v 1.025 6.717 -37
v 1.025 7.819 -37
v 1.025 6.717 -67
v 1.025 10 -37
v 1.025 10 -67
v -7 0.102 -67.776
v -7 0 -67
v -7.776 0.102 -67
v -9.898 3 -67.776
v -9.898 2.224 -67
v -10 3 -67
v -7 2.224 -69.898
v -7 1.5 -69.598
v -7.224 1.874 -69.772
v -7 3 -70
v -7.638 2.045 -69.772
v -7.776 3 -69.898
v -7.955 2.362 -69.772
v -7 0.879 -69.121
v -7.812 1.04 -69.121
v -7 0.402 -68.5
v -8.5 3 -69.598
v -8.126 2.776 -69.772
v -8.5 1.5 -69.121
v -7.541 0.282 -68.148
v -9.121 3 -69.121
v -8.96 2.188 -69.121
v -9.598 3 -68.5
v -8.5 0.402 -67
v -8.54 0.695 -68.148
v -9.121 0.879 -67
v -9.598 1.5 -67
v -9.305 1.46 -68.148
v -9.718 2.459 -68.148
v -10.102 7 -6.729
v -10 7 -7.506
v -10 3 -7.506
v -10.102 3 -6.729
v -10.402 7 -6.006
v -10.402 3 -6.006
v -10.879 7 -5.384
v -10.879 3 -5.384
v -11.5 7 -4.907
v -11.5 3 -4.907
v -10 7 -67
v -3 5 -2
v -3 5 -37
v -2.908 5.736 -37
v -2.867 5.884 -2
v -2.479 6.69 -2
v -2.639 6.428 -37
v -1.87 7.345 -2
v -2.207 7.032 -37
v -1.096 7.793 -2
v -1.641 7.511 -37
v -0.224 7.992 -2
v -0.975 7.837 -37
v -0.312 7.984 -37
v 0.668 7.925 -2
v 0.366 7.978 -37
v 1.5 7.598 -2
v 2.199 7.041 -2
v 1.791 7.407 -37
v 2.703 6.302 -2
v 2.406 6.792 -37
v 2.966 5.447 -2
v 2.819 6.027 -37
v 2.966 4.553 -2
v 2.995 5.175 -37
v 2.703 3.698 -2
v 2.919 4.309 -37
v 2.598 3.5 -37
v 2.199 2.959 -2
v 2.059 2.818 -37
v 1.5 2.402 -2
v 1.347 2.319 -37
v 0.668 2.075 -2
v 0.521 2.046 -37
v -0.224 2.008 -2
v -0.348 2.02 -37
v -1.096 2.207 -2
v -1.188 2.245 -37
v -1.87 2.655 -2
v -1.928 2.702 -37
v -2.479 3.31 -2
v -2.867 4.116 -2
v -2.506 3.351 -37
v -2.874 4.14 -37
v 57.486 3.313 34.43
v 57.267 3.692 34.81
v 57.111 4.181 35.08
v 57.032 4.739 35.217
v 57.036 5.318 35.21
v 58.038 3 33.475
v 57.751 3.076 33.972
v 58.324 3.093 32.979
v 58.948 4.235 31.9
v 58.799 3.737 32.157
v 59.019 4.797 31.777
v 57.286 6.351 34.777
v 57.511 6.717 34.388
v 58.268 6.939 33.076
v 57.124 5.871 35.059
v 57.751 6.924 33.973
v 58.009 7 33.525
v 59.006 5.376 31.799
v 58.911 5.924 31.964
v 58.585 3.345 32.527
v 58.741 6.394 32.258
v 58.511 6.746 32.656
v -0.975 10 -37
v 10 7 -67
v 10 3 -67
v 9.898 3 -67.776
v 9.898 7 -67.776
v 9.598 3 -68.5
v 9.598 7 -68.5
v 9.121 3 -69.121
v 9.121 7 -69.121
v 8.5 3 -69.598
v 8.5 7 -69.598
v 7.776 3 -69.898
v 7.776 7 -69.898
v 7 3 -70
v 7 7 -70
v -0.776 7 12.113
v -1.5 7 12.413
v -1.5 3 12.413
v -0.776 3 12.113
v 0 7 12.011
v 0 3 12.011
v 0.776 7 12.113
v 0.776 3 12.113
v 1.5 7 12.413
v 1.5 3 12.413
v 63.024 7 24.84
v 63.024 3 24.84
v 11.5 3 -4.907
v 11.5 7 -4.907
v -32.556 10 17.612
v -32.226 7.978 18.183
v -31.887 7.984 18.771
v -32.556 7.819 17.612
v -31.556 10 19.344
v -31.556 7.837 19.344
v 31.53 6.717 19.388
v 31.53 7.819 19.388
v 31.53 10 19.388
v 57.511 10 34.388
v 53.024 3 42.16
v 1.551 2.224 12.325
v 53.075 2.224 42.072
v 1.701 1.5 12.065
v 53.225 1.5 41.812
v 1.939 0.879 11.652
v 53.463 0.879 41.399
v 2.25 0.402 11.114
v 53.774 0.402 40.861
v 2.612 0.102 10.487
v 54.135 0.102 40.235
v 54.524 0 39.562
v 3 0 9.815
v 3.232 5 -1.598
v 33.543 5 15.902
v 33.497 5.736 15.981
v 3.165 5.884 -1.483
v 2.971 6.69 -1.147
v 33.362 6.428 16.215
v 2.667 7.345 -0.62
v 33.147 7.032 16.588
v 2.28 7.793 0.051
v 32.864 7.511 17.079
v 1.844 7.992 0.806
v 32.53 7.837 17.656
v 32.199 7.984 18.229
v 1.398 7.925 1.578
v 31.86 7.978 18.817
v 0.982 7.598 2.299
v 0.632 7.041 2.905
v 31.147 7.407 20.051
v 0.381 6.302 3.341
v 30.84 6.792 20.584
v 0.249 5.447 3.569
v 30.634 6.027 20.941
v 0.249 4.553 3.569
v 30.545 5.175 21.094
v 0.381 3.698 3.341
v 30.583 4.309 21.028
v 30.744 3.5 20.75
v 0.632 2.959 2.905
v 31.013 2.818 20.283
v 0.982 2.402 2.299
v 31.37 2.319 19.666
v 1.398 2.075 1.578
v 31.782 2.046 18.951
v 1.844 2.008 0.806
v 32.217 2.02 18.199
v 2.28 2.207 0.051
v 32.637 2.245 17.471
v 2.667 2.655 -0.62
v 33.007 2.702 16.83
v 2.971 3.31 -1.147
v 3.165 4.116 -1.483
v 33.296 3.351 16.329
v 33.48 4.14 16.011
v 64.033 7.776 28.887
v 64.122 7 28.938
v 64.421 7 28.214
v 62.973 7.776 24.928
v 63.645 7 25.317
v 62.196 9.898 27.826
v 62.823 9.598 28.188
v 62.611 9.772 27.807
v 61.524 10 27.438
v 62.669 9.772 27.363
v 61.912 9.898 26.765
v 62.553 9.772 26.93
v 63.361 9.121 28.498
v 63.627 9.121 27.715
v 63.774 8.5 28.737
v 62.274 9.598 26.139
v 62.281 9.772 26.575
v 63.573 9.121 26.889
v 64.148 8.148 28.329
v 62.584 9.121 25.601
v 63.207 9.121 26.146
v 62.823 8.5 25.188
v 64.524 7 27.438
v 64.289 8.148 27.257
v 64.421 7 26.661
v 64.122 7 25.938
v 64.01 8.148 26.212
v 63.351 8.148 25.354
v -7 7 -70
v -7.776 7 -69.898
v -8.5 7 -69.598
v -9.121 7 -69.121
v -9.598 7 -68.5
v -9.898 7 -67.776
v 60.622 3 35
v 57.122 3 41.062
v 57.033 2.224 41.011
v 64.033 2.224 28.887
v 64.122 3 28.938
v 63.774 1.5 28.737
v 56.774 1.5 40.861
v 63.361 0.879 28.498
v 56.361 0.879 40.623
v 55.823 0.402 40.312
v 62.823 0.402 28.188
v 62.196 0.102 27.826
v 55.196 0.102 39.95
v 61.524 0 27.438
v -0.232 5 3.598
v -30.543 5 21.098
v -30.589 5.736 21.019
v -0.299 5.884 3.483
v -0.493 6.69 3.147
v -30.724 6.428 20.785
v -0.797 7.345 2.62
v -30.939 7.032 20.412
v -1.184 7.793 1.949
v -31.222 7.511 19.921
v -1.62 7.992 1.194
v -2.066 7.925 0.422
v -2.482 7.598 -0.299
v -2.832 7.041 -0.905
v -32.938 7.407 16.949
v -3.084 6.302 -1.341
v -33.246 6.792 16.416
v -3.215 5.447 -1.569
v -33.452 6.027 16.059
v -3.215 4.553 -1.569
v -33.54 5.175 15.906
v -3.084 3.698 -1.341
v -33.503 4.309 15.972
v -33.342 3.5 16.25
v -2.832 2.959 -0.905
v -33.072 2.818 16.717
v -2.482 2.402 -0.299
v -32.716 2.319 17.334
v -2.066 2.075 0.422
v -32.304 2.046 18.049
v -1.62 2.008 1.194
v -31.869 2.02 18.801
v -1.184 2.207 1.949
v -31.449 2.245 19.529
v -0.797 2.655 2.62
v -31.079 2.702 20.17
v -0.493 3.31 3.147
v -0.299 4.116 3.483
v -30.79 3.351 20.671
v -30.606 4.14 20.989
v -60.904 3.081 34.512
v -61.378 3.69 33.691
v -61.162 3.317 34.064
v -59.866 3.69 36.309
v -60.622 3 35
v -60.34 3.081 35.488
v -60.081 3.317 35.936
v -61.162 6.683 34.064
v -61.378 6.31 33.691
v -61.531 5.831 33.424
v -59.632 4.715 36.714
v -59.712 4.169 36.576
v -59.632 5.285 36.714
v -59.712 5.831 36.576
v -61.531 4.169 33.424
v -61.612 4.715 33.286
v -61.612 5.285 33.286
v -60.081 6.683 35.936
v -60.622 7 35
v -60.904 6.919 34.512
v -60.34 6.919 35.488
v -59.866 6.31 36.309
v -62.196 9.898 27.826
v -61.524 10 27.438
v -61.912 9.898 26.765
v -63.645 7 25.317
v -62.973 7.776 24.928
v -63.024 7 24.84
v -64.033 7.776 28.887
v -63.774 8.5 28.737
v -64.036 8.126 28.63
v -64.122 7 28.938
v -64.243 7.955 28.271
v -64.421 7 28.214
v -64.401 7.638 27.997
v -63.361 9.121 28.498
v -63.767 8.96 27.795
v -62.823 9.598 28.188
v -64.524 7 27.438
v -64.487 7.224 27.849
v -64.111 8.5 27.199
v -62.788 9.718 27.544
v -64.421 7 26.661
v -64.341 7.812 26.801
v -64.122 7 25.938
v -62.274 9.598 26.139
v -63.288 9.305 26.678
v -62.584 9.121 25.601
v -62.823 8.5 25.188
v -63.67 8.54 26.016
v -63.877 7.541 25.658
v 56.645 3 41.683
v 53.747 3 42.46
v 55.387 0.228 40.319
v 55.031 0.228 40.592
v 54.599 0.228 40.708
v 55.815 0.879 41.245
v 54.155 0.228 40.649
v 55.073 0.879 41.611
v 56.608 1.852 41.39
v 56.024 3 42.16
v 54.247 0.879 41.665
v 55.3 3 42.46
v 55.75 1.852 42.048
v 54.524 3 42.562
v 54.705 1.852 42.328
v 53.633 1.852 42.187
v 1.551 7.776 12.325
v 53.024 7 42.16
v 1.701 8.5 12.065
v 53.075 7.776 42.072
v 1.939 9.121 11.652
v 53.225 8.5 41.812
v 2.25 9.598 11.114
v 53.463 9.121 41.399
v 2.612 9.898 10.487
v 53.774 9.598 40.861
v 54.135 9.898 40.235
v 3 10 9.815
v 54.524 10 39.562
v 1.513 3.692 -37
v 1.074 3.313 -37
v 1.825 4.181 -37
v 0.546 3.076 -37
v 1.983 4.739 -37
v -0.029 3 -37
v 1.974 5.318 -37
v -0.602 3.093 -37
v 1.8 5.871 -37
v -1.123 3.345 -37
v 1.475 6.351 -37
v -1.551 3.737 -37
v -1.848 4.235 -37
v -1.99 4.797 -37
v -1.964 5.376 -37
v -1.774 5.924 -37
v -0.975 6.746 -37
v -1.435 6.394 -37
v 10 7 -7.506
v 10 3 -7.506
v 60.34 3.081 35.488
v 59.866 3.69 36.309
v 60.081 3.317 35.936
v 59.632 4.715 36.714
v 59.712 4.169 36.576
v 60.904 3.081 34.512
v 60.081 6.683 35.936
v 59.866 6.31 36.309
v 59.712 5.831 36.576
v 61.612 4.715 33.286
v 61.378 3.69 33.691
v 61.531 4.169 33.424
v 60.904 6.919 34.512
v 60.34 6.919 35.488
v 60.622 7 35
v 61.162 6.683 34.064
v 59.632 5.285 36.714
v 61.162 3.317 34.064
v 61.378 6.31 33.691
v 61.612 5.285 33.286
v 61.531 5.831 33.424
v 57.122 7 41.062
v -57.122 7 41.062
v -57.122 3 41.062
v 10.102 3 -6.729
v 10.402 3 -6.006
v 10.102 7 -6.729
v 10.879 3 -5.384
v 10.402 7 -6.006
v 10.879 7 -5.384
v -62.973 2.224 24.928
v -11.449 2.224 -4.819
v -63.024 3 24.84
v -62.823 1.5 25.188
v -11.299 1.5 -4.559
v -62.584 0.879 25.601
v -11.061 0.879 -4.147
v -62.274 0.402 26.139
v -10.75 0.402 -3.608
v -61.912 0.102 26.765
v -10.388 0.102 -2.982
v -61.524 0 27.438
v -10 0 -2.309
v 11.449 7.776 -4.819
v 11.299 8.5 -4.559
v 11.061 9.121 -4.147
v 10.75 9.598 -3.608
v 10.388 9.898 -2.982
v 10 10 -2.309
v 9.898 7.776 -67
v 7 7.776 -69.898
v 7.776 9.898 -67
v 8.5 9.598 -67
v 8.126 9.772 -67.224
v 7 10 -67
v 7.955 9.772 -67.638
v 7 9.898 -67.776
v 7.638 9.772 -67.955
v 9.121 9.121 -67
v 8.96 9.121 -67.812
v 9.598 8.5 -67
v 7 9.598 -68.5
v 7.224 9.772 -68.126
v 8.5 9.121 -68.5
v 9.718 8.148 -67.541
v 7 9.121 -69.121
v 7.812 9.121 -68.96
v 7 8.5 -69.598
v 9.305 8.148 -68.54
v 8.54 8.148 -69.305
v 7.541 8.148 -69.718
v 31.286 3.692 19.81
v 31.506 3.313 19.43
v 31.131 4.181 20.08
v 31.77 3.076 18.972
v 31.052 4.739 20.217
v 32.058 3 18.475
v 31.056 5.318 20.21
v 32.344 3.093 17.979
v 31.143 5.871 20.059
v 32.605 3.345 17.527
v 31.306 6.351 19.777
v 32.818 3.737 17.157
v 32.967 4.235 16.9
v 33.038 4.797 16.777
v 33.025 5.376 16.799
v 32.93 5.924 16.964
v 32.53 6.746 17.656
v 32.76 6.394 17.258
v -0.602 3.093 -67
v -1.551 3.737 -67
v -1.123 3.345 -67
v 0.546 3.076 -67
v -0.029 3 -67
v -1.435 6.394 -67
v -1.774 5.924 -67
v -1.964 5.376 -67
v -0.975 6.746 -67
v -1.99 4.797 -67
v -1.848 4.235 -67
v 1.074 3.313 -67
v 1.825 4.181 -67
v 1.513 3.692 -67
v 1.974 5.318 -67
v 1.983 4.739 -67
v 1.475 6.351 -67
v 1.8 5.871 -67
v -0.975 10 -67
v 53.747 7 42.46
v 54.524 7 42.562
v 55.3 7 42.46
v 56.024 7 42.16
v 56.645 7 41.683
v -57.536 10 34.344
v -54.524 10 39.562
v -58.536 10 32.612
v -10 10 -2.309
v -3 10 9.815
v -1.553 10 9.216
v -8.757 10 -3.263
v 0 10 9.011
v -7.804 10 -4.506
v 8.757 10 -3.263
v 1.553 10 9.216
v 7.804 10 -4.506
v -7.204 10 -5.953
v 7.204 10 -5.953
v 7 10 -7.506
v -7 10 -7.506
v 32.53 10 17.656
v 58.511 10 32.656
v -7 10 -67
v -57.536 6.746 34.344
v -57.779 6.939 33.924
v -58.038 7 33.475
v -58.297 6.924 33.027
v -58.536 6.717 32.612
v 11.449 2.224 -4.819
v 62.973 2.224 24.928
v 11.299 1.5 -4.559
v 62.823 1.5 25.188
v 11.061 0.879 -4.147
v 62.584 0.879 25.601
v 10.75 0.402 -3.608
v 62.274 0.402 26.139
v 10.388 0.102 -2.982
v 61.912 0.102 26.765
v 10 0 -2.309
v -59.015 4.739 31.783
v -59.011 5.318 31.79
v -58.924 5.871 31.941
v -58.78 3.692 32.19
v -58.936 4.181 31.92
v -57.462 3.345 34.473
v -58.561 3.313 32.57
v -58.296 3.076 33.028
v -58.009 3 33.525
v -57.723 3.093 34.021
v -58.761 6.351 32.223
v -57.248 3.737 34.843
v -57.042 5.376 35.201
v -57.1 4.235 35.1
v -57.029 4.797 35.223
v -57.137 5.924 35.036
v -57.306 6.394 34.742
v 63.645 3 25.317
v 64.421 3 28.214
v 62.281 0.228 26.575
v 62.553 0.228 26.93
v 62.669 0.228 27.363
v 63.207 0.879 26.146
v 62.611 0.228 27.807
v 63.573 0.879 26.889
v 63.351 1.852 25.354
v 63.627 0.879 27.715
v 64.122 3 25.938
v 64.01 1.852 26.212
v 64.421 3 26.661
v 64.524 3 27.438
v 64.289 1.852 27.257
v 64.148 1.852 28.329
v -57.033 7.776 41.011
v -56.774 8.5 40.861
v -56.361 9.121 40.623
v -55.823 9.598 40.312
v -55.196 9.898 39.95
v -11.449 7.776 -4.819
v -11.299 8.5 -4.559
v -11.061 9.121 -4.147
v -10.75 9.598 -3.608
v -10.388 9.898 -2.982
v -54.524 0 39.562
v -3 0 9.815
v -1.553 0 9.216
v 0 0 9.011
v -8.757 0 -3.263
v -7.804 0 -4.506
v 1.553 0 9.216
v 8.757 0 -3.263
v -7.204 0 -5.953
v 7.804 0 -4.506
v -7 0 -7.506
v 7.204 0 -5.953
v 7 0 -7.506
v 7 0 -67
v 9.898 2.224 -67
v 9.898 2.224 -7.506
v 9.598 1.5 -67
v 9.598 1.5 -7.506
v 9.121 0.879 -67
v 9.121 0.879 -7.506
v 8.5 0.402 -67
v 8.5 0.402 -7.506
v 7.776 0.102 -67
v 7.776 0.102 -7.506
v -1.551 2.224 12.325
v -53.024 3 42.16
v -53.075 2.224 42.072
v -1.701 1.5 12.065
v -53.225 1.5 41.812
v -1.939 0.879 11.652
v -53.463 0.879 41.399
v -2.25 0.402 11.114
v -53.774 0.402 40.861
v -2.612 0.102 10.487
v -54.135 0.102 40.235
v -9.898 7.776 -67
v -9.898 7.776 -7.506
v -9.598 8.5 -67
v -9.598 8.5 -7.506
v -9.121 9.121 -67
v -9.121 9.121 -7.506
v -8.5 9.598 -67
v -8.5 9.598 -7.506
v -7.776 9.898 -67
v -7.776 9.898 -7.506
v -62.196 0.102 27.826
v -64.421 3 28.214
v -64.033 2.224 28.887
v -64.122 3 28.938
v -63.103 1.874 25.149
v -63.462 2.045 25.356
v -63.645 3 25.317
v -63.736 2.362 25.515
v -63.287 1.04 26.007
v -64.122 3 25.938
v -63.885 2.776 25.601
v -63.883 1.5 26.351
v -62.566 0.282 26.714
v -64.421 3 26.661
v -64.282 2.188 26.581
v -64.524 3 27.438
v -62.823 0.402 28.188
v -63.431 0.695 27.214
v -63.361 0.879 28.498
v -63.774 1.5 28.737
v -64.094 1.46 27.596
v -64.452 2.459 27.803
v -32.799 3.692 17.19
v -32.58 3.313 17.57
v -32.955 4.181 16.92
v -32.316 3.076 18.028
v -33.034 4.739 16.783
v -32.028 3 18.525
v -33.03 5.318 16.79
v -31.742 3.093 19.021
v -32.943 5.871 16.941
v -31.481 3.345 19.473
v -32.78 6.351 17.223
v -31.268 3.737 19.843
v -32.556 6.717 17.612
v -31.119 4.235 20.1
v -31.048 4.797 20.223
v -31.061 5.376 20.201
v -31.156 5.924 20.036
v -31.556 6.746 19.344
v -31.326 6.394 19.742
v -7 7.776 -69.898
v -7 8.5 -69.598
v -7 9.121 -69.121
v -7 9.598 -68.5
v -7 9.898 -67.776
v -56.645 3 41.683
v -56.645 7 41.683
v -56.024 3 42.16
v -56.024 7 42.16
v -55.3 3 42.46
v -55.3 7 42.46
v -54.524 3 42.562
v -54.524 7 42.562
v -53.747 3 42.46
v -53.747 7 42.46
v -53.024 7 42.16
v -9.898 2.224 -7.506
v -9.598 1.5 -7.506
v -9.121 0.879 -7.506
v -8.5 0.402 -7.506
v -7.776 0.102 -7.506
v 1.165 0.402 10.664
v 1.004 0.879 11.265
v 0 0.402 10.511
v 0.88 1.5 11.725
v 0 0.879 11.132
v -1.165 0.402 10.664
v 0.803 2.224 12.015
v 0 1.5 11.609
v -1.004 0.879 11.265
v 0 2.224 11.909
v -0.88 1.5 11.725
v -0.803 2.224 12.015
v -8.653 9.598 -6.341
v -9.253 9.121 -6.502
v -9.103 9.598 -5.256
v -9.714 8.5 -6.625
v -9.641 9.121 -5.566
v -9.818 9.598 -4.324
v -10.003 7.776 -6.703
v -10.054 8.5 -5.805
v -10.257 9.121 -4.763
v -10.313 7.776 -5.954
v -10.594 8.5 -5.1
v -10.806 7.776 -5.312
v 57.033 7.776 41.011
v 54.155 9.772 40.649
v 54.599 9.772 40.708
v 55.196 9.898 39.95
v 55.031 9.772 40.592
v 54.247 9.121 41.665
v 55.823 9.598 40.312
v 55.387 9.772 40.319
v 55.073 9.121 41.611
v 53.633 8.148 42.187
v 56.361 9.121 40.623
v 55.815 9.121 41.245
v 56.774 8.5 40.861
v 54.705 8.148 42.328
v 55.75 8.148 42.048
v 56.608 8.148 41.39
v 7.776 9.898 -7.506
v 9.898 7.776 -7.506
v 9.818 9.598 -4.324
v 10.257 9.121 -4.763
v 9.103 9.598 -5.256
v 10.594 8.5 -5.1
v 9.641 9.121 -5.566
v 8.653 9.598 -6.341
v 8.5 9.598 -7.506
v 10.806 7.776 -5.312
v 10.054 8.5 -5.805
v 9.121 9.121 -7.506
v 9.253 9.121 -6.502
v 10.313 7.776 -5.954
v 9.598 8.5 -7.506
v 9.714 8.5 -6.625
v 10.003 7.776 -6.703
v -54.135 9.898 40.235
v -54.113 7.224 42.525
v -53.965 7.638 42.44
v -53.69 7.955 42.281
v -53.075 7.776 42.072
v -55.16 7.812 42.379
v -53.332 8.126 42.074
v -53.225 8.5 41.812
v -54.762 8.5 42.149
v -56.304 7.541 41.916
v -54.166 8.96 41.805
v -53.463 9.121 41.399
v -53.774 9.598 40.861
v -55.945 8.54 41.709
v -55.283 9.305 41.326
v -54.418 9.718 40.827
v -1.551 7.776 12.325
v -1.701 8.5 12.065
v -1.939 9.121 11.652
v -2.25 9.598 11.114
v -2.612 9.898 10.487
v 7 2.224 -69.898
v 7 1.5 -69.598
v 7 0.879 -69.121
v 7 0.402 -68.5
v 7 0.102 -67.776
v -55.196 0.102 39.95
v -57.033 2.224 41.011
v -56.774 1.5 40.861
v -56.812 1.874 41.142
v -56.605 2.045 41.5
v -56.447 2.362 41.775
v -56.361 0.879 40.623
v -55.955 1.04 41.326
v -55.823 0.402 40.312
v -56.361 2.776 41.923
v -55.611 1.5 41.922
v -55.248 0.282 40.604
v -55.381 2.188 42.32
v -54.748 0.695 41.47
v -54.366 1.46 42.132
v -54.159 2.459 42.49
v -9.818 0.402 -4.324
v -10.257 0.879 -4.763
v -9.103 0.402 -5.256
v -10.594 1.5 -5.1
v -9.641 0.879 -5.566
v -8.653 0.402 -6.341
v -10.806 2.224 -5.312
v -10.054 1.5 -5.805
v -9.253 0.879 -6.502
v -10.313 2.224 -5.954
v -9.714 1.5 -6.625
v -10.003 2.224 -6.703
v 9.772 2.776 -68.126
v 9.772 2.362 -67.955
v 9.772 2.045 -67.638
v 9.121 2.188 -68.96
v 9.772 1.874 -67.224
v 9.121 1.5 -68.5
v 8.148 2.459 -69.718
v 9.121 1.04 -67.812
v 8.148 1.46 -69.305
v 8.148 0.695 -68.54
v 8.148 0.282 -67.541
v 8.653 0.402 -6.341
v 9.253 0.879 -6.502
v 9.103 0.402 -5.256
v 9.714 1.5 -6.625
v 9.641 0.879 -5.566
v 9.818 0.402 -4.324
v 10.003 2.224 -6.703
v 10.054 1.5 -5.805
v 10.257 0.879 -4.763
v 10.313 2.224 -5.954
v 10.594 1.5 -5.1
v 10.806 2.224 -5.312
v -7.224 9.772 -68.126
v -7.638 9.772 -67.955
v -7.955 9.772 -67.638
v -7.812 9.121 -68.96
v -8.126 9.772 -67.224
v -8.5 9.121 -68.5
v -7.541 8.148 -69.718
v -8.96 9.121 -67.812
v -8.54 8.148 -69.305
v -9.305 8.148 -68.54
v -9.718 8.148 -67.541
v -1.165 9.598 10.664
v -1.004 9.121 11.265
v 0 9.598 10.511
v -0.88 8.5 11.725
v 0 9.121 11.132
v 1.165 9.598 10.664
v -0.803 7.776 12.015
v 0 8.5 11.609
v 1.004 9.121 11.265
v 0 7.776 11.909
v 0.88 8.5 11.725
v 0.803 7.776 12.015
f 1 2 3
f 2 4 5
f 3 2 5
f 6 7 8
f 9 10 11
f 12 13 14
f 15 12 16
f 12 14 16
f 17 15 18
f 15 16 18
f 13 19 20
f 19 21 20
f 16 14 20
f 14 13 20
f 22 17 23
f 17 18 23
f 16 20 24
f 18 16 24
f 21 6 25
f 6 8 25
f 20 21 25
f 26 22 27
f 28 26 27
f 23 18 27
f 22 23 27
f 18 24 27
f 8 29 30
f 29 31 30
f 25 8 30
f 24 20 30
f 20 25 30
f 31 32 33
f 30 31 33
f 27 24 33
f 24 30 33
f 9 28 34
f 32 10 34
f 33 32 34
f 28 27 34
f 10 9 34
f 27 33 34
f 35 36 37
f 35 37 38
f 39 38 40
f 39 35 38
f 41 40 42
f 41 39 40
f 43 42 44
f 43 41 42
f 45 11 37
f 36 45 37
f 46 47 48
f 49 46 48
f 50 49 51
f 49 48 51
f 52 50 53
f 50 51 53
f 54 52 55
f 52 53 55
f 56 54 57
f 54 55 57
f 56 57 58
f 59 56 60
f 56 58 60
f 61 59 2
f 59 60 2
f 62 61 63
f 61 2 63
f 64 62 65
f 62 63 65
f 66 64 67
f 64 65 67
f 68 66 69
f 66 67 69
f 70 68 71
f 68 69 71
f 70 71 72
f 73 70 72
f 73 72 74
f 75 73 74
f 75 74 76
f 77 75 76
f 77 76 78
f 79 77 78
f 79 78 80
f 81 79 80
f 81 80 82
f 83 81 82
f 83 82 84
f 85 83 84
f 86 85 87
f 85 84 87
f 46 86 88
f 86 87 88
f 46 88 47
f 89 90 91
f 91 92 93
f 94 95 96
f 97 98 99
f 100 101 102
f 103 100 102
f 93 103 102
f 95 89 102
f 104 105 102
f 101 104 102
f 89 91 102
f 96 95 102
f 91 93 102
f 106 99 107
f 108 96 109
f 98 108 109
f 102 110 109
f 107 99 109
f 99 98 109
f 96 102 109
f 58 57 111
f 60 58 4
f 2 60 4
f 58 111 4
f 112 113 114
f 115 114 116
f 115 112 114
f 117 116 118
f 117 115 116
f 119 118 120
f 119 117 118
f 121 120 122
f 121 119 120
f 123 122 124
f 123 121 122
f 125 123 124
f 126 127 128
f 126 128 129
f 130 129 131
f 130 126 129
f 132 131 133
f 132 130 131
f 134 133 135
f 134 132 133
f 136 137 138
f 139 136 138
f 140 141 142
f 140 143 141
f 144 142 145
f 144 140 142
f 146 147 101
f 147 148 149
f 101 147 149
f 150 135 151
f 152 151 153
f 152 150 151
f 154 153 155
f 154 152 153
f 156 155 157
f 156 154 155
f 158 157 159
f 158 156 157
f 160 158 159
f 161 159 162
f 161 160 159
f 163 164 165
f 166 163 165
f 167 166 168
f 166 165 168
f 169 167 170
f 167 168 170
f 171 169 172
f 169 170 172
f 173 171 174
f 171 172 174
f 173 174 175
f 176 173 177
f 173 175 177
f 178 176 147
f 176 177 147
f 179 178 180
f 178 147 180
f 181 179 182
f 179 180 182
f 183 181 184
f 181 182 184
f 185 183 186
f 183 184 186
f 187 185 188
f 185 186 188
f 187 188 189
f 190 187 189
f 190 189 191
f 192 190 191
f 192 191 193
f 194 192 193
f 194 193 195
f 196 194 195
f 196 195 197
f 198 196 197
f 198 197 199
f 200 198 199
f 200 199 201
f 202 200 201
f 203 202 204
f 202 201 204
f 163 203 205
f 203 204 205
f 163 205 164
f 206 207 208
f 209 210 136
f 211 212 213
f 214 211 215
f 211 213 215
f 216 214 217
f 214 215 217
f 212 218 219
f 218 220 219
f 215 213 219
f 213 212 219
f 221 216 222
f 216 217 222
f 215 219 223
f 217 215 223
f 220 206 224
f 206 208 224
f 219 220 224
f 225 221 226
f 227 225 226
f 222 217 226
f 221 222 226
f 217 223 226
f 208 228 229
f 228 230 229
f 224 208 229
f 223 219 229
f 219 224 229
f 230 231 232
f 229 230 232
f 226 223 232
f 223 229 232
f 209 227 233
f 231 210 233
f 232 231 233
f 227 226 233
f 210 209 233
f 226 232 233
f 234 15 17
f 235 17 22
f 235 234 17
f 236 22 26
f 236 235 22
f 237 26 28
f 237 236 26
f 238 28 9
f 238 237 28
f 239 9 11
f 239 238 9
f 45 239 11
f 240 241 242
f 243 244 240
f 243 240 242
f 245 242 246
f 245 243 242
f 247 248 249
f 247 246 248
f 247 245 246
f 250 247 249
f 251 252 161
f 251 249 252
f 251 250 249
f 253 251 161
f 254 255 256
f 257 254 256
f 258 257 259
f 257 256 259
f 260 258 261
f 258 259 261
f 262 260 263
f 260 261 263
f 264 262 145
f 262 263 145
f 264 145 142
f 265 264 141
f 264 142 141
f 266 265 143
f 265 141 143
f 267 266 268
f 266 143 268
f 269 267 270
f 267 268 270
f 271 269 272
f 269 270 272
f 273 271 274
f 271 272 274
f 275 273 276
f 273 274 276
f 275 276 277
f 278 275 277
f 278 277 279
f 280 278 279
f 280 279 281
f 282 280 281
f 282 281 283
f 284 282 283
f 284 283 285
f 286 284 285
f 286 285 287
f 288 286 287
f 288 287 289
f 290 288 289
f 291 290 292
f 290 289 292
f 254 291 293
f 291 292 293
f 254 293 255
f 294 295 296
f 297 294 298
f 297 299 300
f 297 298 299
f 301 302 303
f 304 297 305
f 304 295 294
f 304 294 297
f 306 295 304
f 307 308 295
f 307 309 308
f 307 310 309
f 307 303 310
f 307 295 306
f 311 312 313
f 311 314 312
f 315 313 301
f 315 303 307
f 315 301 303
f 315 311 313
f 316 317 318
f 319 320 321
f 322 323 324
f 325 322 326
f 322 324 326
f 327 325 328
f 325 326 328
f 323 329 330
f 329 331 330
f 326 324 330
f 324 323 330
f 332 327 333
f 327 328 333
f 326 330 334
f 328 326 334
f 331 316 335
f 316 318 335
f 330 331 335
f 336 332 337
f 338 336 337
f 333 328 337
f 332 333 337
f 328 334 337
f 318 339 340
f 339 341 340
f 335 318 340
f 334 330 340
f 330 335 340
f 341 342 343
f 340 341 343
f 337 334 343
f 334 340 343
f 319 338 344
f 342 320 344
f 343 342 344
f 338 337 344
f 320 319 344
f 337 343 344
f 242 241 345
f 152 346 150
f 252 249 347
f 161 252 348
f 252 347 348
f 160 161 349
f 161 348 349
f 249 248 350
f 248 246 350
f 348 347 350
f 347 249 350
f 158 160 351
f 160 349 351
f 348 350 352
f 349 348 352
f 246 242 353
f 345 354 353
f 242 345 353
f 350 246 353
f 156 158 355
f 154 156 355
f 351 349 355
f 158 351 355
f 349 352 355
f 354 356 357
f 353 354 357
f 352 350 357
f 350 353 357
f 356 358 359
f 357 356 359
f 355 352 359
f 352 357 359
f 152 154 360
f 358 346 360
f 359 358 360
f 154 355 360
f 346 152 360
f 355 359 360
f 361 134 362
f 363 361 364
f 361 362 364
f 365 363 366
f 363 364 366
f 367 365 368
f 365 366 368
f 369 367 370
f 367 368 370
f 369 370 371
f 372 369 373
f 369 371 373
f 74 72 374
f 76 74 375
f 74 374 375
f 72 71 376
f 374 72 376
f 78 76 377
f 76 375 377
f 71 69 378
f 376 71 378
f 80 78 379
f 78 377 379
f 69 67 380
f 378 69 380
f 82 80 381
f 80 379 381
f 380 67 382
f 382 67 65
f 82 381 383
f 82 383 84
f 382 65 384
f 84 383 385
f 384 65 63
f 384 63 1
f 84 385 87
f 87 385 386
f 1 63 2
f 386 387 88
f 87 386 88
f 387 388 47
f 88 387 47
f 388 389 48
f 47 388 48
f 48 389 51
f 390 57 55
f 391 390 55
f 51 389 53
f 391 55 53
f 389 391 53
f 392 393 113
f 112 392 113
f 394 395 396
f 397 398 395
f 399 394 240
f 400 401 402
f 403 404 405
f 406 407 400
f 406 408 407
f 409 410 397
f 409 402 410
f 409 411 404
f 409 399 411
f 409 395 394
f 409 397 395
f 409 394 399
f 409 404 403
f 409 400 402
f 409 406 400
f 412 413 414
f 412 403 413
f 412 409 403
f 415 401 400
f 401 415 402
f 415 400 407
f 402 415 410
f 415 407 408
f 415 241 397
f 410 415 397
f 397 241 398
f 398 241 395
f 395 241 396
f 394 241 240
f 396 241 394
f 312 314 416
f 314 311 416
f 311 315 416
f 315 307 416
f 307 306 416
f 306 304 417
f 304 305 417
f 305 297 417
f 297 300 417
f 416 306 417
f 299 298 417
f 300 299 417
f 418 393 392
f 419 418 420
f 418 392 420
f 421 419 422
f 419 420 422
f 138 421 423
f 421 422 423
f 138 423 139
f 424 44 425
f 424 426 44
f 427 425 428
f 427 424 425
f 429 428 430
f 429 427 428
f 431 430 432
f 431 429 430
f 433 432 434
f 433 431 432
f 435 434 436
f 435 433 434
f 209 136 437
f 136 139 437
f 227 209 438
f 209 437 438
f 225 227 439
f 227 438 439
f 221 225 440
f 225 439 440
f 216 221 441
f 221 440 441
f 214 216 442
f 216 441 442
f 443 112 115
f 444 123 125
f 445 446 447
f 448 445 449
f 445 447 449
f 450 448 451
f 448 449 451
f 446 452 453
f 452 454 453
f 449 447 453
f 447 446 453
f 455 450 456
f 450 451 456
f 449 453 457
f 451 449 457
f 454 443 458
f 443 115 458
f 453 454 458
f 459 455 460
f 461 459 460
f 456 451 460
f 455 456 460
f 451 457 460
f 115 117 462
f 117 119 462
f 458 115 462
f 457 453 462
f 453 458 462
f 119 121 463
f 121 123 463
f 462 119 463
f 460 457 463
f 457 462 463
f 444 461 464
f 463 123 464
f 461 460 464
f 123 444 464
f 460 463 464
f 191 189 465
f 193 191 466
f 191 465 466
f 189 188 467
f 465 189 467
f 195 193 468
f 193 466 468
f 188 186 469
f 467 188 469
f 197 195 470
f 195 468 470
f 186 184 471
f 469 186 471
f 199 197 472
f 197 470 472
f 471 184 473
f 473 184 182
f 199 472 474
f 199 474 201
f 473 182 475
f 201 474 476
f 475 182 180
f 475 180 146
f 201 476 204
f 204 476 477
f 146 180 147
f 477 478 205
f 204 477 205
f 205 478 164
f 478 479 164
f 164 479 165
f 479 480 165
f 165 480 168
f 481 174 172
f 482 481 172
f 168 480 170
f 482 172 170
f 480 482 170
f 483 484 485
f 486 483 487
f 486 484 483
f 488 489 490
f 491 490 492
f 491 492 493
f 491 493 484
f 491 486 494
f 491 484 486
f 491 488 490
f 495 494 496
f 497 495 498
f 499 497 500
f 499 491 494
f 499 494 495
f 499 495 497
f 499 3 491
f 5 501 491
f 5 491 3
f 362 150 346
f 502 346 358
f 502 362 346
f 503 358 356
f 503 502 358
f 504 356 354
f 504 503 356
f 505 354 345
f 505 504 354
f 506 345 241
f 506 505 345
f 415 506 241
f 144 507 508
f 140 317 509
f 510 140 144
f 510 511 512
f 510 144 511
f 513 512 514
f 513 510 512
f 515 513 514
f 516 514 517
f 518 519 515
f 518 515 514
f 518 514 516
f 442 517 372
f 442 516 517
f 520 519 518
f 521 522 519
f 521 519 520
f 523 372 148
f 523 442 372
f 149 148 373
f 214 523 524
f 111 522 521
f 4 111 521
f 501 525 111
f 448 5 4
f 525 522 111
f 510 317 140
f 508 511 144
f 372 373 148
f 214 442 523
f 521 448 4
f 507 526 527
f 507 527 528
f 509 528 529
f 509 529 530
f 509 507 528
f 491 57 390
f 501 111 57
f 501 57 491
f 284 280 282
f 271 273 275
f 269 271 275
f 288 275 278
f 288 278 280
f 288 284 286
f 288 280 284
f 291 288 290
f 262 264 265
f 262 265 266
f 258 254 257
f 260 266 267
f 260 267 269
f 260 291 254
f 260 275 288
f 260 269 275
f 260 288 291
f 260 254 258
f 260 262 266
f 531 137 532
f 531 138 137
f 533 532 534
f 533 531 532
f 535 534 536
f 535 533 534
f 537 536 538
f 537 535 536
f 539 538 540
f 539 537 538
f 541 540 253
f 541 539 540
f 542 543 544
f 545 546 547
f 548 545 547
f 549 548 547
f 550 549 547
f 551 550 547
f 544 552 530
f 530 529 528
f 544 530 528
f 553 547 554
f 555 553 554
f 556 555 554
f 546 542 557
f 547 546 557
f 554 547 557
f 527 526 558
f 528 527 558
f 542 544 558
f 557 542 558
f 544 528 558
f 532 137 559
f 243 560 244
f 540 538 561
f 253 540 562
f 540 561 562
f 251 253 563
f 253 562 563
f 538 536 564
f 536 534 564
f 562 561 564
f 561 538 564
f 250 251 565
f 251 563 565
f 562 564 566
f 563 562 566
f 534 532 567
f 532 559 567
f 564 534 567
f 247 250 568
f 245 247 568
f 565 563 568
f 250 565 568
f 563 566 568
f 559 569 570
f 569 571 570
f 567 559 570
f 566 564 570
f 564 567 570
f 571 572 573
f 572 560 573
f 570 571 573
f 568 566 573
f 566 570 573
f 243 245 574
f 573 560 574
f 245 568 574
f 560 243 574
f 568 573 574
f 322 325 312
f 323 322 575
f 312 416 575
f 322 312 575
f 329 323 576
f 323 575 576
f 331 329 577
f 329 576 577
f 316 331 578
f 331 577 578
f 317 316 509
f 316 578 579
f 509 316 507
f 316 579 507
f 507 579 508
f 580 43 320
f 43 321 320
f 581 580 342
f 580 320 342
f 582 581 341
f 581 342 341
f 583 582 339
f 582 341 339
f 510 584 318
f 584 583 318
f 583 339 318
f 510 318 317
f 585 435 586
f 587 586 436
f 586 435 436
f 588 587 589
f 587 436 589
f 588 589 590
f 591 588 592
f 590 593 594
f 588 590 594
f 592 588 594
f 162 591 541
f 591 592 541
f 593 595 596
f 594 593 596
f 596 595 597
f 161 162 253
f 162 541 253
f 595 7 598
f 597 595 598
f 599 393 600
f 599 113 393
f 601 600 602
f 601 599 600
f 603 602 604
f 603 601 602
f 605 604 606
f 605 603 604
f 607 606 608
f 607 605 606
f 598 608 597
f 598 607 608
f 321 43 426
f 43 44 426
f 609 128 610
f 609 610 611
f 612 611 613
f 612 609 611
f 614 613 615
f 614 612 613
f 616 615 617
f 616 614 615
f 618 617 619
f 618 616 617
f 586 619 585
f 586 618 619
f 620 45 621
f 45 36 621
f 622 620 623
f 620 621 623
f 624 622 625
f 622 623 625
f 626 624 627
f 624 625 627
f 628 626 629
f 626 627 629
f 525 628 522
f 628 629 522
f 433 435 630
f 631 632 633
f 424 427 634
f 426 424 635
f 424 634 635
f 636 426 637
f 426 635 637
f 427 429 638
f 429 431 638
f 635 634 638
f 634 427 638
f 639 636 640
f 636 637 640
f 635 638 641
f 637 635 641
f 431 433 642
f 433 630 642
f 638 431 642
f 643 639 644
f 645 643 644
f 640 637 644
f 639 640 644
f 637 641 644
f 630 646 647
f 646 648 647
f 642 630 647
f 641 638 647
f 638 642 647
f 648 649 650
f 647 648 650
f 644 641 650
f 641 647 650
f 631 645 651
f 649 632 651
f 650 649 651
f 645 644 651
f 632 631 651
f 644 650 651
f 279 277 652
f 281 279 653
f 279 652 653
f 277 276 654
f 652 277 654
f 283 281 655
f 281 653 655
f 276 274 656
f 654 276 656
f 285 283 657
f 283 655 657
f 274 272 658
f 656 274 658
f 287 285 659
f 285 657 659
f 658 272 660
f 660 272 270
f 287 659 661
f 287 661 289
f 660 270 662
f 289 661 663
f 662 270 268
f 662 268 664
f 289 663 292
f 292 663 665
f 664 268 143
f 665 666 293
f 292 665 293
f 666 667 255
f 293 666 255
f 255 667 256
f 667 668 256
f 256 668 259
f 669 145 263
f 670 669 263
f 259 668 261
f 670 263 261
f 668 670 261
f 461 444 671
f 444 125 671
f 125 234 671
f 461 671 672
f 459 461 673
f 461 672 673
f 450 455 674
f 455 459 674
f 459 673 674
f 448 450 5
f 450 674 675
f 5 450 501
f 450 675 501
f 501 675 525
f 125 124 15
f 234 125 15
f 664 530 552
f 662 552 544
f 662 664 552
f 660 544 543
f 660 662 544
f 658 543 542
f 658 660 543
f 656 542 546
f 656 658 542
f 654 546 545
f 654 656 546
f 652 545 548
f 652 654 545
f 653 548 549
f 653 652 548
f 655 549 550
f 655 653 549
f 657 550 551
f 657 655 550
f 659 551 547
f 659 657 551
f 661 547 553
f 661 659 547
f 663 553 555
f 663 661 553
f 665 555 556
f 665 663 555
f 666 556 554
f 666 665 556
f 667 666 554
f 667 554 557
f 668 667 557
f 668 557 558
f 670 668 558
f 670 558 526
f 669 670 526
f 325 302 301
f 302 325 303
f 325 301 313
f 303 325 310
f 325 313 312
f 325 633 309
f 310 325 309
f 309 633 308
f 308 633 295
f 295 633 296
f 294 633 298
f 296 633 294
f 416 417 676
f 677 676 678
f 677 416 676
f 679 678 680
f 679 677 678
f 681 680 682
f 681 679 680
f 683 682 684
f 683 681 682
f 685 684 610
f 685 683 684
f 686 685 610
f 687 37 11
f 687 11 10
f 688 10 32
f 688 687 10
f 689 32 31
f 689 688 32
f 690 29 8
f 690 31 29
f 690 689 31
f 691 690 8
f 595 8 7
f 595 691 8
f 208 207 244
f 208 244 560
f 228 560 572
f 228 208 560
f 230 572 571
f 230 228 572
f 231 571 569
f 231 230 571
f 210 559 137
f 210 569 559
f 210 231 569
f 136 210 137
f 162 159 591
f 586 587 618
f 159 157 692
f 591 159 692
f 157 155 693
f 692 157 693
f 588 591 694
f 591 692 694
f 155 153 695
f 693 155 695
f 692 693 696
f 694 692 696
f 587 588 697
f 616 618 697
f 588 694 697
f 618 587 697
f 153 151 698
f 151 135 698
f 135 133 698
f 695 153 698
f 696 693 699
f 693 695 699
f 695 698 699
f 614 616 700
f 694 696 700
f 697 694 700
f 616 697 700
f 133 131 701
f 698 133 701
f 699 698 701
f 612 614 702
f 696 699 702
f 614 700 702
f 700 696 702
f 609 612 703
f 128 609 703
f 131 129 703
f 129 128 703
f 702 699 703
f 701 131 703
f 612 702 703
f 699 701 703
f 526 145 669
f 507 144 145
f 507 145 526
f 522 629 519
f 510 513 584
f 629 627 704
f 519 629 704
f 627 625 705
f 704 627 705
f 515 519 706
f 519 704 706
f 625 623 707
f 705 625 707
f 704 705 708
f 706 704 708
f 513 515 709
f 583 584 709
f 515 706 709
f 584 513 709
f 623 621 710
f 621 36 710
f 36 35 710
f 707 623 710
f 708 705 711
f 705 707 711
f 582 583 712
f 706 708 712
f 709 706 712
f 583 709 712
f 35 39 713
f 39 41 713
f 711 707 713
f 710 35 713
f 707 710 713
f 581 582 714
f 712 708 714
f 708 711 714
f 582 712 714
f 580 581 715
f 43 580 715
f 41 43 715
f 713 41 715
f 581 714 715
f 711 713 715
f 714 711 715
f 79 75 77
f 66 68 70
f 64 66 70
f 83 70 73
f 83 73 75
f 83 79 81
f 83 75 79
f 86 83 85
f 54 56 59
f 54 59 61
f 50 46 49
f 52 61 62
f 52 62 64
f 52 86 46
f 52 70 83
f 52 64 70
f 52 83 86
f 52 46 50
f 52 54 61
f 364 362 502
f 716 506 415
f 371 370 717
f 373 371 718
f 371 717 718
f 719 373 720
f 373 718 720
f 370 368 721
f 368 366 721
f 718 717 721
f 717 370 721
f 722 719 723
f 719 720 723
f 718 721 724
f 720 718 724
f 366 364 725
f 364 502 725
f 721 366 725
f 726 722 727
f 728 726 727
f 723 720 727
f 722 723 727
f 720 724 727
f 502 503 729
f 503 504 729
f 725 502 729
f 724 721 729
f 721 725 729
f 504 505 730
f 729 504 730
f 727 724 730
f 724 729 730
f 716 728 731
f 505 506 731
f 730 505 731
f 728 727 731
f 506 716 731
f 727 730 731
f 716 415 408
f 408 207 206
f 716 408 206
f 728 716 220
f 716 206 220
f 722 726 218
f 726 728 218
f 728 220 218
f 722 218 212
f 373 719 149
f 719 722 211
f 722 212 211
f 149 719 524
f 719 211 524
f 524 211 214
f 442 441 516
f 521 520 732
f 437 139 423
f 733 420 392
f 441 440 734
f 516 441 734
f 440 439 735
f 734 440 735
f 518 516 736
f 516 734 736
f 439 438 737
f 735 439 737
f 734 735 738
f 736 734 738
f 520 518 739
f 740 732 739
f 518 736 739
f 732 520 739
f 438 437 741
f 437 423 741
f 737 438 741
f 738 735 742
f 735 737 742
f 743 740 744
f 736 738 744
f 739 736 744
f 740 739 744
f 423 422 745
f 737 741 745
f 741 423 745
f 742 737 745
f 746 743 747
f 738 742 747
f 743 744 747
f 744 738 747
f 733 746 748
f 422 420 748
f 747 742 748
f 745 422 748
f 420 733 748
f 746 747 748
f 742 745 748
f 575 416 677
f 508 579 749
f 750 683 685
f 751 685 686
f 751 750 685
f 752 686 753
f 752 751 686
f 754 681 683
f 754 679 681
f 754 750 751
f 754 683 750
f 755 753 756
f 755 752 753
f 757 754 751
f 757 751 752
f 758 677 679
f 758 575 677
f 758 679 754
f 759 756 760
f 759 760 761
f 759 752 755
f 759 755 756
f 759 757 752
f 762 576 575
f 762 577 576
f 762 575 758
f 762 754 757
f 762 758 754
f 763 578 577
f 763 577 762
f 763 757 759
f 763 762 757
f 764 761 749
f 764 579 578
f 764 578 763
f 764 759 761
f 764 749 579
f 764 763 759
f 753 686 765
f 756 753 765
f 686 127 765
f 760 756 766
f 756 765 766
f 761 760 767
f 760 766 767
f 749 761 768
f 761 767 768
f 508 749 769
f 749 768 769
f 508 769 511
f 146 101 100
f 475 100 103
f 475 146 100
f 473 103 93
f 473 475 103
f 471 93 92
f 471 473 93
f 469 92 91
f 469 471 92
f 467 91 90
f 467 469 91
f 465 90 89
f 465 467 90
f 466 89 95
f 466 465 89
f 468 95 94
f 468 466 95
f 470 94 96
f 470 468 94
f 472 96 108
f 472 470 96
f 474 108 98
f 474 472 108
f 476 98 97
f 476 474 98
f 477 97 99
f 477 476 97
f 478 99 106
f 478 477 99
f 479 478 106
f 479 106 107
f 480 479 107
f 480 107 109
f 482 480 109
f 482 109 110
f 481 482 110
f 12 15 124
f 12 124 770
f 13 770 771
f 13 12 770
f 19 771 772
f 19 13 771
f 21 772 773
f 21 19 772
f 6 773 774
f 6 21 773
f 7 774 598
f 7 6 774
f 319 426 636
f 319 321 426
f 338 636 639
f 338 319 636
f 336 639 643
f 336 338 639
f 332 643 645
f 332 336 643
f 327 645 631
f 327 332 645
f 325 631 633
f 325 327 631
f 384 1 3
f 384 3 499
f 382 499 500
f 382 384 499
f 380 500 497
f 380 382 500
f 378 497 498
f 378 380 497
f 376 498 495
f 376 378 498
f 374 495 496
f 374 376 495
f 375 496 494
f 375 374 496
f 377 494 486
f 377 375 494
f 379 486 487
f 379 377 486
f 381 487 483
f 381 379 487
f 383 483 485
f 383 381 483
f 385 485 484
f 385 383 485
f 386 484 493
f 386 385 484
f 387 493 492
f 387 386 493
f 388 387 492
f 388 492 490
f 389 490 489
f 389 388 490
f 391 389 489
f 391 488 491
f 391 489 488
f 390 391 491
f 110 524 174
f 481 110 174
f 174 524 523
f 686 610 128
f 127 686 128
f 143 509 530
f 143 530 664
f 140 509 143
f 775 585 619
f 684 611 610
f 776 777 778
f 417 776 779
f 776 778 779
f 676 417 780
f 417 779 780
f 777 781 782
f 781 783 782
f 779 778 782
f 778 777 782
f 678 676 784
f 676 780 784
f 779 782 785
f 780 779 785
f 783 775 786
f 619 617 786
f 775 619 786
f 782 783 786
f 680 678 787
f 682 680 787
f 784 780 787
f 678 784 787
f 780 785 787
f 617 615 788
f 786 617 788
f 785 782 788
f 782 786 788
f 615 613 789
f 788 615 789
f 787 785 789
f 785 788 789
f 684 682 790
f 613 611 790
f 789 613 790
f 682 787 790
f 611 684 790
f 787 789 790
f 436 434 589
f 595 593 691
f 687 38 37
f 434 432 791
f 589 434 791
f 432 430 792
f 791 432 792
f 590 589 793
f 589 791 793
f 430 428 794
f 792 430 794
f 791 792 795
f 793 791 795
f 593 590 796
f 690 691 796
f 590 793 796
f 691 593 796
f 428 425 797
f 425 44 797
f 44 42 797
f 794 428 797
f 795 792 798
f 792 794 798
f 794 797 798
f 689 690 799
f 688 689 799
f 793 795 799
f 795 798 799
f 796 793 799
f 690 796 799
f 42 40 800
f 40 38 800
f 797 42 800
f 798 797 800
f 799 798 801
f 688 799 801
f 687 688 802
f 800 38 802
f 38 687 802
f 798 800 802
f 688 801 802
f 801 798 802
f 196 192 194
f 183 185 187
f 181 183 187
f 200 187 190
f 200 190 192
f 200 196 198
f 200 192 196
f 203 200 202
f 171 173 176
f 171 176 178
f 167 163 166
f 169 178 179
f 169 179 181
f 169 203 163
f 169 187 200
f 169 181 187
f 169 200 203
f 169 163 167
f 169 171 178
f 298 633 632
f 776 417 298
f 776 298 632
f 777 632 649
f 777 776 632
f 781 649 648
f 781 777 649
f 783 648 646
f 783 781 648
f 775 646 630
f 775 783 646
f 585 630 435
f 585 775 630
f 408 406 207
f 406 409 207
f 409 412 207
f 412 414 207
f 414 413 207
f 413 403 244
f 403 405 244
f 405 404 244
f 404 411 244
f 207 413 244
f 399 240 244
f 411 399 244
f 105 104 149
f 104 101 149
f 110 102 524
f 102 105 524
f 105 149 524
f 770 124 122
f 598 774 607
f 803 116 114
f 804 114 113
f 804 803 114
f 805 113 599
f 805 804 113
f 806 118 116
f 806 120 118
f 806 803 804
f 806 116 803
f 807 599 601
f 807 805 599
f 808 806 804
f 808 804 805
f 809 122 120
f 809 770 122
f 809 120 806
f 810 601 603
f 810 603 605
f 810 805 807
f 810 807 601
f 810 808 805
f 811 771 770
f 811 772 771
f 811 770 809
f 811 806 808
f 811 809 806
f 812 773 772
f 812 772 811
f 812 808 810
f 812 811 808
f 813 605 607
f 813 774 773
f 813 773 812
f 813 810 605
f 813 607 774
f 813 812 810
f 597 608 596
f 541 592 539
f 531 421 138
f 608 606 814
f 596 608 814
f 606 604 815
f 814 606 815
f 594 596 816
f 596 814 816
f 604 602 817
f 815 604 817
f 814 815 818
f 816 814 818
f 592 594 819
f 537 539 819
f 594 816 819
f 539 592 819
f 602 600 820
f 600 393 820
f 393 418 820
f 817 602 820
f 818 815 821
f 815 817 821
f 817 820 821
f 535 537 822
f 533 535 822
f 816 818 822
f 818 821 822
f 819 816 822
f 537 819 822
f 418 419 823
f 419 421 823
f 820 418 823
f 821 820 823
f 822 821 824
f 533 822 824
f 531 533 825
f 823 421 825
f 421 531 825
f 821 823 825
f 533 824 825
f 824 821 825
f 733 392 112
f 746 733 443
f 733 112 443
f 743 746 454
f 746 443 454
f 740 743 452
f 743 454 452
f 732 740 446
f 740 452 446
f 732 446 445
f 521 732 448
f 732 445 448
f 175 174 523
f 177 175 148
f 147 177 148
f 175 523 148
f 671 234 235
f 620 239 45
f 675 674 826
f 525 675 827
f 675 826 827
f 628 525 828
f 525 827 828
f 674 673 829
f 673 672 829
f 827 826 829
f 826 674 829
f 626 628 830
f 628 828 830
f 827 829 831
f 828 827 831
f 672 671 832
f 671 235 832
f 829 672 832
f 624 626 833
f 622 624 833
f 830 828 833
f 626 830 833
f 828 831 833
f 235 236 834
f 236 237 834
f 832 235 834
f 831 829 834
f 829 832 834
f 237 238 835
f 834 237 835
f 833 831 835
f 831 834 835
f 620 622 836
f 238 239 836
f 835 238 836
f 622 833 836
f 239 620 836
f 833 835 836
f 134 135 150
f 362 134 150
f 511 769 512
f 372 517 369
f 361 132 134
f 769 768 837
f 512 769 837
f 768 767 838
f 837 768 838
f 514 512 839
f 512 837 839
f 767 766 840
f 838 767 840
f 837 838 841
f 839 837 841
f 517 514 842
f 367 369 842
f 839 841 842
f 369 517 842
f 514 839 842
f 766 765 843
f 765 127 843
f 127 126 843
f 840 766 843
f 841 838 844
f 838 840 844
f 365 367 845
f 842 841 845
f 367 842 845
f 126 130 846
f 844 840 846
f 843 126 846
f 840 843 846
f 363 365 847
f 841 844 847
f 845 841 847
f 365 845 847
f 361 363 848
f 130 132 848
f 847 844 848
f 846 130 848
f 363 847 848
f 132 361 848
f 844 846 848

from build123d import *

# Parameters (mm, degrees)
BOSS_EXTRUDE1_DEPTH = 10
FILLET3_R           = 3
CUT_EXTRUDE8_START  = -33
SKETCH8_R           = 2
CUT_EXTRUDE8_DEPTH  = 197.665485806
SKETCH11_R          = 3
CUT_EXTRUDE9_DEPTH  = 35
SKETCH7_W           = 2
SKETCH7_H           = 30
CUT_EXTRUDE10_DEPTH = 5
CUT_EXTRUDE11_DEPTH = 5
CUT_EXTRUDE12_DEPTH = 5
CIRPATTERN8_COUNT   = 3
SKETCH17_W          = 14
SKETCH17_H          = 4
BOSS_EXTRUDE3_DEPTH = 3
CIRPATTERN9_COUNT   = 3


with BuildPart() as part:
    # Sketch2 → Boss-Extrude1 (new body)
    with BuildSketch(Plane(origin=(0, 0, 0), x_dir=(1, 0, 0), z_dir=(0, 1, 0))):
        Polygon((10, 5.773502692), (10, 70), (-10, 70), (-10, 5.773502692), (-65.621778265, -26.339745962), (-55.621778265, -43.660254038), (0, -11.547005384), (55.621778265, -43.660254038), (65.621778265, -26.339745962), align=None)
    extrude(amount=BOSS_EXTRUDE1_DEPTH)

    # Fillet3
    fillet3_edges = [part.edges().sort_by_distance(p)[0] for p in [
        (-10, 5, -70),
        (10, 5, -70),
        (65.621778265, 5, 26.339745962),
        (55.621778265, 5, 43.660254038),
        (-65.621778265, 5, 26.339745962),
        (-55.621778265, 5, 43.660254038),
        (10, 10, -37.886751346),
        (10, 5, -5.773502692),
        (37.810889132, 0, 10.283121635),
        (10, 0, -37.886751346),
        (60.621778265, 0, 35),
        (60.621778265, 10, 35),
        (27.810889132, 0, 27.603629711),
        (0, 5, 11.547005384),
        (-27.810889132, 0, 27.603629711),
        (-10, 5, -5.773502692),
        (-37.810889132, 0, 10.283121635),
        (-10, 0, -37.886751346),
        (-60.621778265, 10, 35),
        (-60.621778265, 0, 35),
        (0, 0, -70),
        (0, 10, -70),
        (37.810889132, 10, 10.283121635),
        (27.810889132, 10, 27.603629711),
        (-27.810889132, 10, 27.603629711),
        (-37.810889132, 10, 10.283121635),
        (-10, 10, -37.886751346),
    ]]
    fillet(fillet3_edges, radius=FILLET3_R)

    # Sketch8 → Cut-Extrude8 (cut)
    with BuildSketch(Plane(origin=(60.621778265, 0, 35), x_dir=(0.49999999999999983, 0, -0.8660254037844388), z_dir=(0.8660254037844387, 0, 0.4999999999999998)).offset(CUT_EXTRUDE8_START)):
        with Locations((0, 5)):
            Circle(SKETCH8_R)
    cut_extrude8 = extrude(amount=CUT_EXTRUDE8_DEPTH, mode=Mode.SUBTRACT)

    # Sketch11 → Cut-Extrude9 (cut)
    with BuildSketch(Plane(origin=(32.04293994, 0, 18.5), x_dir=(0.49999999999999994, 0, -0.8660254037844387), z_dir=(0.8660254037844386, 0, 0.4999999999999999))):
        with Locations((0, 5)):
            Circle(SKETCH11_R)
    cut_extrude9 = extrude(amount=-CUT_EXTRUDE9_DEPTH, mode=Mode.SUBTRACT)

    # Sketch7 → Cut-Extrude10 (cut)
    with BuildSketch(Plane(origin=(0, 10, 0), x_dir=(1, 0, 0), z_dir=(0, 1, 0))):
        with Locations((0.025333085, 52)):
            Rectangle(SKETCH7_W, SKETCH7_H)
    extrude(amount=-CUT_EXTRUDE10_DEPTH, mode=Mode.SUBTRACT)

    # Sketch7<7> → Cut-Extrude11 (cut)
    with BuildSketch(Plane(origin=(0, 10, 0), x_dir=(1, 0, 0), z_dir=(0, 1, 0))):
        Polygon((-32.555606483, -17.612035501), (-58.536368596, -32.612035501), (-57.536368596, -34.344086308), (-31.555606483, -19.344086308), align=None)
    extrude(amount=-CUT_EXTRUDE11_DEPTH, mode=Mode.SUBTRACT)

    # Sketch7<8> → Cut-Extrude12 (cut)
    with BuildSketch(Plane(origin=(0, 10, 0), x_dir=(1, 0, 0), z_dir=(0, 1, 0))):
        Polygon((31.530273397, -19.387964499), (57.511035511, -34.387964499), (58.511035511, -32.655913692), (32.530273397, -17.655913692), align=None)
    extrude(amount=-CUT_EXTRUDE12_DEPTH, mode=Mode.SUBTRACT)

    # CirPattern8: Cut-Extrude8, Cut-Extrude9 ×3 about axis
    cirpattern8_axis = Axis((0, 10, 0), (0, 1, 0))
    add([cut_extrude8.rotate(cirpattern8_axis, i * 360 / CIRPATTERN8_COUNT) for i in range(1, CIRPATTERN8_COUNT)], mode=Mode.SUBTRACT)
    add([cut_extrude9.rotate(cirpattern8_axis, i * 360 / CIRPATTERN8_COUNT) for i in range(1, CIRPATTERN8_COUNT)], mode=Mode.SUBTRACT)

    # Sketch17 → Boss-Extrude3 (add)
    with BuildSketch(Plane(origin=(60.621778265, 0, 35), x_dir=(0.49999999999999983, 0, -0.8660254037844388), z_dir=(0.8660254037844387, 0, 0.4999999999999998))):
        with Locations((0, 5)):
            Rectangle(SKETCH17_W, SKETCH17_H)
    boss_extrude3 = extrude(amount=-BOSS_EXTRUDE3_DEPTH)

    # CirPattern9: Boss-Extrude3 ×3 about axis
    cirpattern9_axis = Axis((0, 10, 0), (0, 1, 0))
    for i in range(1, CIRPATTERN9_COUNT):
        add(boss_extrude3.rotate(cirpattern9_axis, i * 360 / CIRPATTERN9_COUNT))


solid = part.part
